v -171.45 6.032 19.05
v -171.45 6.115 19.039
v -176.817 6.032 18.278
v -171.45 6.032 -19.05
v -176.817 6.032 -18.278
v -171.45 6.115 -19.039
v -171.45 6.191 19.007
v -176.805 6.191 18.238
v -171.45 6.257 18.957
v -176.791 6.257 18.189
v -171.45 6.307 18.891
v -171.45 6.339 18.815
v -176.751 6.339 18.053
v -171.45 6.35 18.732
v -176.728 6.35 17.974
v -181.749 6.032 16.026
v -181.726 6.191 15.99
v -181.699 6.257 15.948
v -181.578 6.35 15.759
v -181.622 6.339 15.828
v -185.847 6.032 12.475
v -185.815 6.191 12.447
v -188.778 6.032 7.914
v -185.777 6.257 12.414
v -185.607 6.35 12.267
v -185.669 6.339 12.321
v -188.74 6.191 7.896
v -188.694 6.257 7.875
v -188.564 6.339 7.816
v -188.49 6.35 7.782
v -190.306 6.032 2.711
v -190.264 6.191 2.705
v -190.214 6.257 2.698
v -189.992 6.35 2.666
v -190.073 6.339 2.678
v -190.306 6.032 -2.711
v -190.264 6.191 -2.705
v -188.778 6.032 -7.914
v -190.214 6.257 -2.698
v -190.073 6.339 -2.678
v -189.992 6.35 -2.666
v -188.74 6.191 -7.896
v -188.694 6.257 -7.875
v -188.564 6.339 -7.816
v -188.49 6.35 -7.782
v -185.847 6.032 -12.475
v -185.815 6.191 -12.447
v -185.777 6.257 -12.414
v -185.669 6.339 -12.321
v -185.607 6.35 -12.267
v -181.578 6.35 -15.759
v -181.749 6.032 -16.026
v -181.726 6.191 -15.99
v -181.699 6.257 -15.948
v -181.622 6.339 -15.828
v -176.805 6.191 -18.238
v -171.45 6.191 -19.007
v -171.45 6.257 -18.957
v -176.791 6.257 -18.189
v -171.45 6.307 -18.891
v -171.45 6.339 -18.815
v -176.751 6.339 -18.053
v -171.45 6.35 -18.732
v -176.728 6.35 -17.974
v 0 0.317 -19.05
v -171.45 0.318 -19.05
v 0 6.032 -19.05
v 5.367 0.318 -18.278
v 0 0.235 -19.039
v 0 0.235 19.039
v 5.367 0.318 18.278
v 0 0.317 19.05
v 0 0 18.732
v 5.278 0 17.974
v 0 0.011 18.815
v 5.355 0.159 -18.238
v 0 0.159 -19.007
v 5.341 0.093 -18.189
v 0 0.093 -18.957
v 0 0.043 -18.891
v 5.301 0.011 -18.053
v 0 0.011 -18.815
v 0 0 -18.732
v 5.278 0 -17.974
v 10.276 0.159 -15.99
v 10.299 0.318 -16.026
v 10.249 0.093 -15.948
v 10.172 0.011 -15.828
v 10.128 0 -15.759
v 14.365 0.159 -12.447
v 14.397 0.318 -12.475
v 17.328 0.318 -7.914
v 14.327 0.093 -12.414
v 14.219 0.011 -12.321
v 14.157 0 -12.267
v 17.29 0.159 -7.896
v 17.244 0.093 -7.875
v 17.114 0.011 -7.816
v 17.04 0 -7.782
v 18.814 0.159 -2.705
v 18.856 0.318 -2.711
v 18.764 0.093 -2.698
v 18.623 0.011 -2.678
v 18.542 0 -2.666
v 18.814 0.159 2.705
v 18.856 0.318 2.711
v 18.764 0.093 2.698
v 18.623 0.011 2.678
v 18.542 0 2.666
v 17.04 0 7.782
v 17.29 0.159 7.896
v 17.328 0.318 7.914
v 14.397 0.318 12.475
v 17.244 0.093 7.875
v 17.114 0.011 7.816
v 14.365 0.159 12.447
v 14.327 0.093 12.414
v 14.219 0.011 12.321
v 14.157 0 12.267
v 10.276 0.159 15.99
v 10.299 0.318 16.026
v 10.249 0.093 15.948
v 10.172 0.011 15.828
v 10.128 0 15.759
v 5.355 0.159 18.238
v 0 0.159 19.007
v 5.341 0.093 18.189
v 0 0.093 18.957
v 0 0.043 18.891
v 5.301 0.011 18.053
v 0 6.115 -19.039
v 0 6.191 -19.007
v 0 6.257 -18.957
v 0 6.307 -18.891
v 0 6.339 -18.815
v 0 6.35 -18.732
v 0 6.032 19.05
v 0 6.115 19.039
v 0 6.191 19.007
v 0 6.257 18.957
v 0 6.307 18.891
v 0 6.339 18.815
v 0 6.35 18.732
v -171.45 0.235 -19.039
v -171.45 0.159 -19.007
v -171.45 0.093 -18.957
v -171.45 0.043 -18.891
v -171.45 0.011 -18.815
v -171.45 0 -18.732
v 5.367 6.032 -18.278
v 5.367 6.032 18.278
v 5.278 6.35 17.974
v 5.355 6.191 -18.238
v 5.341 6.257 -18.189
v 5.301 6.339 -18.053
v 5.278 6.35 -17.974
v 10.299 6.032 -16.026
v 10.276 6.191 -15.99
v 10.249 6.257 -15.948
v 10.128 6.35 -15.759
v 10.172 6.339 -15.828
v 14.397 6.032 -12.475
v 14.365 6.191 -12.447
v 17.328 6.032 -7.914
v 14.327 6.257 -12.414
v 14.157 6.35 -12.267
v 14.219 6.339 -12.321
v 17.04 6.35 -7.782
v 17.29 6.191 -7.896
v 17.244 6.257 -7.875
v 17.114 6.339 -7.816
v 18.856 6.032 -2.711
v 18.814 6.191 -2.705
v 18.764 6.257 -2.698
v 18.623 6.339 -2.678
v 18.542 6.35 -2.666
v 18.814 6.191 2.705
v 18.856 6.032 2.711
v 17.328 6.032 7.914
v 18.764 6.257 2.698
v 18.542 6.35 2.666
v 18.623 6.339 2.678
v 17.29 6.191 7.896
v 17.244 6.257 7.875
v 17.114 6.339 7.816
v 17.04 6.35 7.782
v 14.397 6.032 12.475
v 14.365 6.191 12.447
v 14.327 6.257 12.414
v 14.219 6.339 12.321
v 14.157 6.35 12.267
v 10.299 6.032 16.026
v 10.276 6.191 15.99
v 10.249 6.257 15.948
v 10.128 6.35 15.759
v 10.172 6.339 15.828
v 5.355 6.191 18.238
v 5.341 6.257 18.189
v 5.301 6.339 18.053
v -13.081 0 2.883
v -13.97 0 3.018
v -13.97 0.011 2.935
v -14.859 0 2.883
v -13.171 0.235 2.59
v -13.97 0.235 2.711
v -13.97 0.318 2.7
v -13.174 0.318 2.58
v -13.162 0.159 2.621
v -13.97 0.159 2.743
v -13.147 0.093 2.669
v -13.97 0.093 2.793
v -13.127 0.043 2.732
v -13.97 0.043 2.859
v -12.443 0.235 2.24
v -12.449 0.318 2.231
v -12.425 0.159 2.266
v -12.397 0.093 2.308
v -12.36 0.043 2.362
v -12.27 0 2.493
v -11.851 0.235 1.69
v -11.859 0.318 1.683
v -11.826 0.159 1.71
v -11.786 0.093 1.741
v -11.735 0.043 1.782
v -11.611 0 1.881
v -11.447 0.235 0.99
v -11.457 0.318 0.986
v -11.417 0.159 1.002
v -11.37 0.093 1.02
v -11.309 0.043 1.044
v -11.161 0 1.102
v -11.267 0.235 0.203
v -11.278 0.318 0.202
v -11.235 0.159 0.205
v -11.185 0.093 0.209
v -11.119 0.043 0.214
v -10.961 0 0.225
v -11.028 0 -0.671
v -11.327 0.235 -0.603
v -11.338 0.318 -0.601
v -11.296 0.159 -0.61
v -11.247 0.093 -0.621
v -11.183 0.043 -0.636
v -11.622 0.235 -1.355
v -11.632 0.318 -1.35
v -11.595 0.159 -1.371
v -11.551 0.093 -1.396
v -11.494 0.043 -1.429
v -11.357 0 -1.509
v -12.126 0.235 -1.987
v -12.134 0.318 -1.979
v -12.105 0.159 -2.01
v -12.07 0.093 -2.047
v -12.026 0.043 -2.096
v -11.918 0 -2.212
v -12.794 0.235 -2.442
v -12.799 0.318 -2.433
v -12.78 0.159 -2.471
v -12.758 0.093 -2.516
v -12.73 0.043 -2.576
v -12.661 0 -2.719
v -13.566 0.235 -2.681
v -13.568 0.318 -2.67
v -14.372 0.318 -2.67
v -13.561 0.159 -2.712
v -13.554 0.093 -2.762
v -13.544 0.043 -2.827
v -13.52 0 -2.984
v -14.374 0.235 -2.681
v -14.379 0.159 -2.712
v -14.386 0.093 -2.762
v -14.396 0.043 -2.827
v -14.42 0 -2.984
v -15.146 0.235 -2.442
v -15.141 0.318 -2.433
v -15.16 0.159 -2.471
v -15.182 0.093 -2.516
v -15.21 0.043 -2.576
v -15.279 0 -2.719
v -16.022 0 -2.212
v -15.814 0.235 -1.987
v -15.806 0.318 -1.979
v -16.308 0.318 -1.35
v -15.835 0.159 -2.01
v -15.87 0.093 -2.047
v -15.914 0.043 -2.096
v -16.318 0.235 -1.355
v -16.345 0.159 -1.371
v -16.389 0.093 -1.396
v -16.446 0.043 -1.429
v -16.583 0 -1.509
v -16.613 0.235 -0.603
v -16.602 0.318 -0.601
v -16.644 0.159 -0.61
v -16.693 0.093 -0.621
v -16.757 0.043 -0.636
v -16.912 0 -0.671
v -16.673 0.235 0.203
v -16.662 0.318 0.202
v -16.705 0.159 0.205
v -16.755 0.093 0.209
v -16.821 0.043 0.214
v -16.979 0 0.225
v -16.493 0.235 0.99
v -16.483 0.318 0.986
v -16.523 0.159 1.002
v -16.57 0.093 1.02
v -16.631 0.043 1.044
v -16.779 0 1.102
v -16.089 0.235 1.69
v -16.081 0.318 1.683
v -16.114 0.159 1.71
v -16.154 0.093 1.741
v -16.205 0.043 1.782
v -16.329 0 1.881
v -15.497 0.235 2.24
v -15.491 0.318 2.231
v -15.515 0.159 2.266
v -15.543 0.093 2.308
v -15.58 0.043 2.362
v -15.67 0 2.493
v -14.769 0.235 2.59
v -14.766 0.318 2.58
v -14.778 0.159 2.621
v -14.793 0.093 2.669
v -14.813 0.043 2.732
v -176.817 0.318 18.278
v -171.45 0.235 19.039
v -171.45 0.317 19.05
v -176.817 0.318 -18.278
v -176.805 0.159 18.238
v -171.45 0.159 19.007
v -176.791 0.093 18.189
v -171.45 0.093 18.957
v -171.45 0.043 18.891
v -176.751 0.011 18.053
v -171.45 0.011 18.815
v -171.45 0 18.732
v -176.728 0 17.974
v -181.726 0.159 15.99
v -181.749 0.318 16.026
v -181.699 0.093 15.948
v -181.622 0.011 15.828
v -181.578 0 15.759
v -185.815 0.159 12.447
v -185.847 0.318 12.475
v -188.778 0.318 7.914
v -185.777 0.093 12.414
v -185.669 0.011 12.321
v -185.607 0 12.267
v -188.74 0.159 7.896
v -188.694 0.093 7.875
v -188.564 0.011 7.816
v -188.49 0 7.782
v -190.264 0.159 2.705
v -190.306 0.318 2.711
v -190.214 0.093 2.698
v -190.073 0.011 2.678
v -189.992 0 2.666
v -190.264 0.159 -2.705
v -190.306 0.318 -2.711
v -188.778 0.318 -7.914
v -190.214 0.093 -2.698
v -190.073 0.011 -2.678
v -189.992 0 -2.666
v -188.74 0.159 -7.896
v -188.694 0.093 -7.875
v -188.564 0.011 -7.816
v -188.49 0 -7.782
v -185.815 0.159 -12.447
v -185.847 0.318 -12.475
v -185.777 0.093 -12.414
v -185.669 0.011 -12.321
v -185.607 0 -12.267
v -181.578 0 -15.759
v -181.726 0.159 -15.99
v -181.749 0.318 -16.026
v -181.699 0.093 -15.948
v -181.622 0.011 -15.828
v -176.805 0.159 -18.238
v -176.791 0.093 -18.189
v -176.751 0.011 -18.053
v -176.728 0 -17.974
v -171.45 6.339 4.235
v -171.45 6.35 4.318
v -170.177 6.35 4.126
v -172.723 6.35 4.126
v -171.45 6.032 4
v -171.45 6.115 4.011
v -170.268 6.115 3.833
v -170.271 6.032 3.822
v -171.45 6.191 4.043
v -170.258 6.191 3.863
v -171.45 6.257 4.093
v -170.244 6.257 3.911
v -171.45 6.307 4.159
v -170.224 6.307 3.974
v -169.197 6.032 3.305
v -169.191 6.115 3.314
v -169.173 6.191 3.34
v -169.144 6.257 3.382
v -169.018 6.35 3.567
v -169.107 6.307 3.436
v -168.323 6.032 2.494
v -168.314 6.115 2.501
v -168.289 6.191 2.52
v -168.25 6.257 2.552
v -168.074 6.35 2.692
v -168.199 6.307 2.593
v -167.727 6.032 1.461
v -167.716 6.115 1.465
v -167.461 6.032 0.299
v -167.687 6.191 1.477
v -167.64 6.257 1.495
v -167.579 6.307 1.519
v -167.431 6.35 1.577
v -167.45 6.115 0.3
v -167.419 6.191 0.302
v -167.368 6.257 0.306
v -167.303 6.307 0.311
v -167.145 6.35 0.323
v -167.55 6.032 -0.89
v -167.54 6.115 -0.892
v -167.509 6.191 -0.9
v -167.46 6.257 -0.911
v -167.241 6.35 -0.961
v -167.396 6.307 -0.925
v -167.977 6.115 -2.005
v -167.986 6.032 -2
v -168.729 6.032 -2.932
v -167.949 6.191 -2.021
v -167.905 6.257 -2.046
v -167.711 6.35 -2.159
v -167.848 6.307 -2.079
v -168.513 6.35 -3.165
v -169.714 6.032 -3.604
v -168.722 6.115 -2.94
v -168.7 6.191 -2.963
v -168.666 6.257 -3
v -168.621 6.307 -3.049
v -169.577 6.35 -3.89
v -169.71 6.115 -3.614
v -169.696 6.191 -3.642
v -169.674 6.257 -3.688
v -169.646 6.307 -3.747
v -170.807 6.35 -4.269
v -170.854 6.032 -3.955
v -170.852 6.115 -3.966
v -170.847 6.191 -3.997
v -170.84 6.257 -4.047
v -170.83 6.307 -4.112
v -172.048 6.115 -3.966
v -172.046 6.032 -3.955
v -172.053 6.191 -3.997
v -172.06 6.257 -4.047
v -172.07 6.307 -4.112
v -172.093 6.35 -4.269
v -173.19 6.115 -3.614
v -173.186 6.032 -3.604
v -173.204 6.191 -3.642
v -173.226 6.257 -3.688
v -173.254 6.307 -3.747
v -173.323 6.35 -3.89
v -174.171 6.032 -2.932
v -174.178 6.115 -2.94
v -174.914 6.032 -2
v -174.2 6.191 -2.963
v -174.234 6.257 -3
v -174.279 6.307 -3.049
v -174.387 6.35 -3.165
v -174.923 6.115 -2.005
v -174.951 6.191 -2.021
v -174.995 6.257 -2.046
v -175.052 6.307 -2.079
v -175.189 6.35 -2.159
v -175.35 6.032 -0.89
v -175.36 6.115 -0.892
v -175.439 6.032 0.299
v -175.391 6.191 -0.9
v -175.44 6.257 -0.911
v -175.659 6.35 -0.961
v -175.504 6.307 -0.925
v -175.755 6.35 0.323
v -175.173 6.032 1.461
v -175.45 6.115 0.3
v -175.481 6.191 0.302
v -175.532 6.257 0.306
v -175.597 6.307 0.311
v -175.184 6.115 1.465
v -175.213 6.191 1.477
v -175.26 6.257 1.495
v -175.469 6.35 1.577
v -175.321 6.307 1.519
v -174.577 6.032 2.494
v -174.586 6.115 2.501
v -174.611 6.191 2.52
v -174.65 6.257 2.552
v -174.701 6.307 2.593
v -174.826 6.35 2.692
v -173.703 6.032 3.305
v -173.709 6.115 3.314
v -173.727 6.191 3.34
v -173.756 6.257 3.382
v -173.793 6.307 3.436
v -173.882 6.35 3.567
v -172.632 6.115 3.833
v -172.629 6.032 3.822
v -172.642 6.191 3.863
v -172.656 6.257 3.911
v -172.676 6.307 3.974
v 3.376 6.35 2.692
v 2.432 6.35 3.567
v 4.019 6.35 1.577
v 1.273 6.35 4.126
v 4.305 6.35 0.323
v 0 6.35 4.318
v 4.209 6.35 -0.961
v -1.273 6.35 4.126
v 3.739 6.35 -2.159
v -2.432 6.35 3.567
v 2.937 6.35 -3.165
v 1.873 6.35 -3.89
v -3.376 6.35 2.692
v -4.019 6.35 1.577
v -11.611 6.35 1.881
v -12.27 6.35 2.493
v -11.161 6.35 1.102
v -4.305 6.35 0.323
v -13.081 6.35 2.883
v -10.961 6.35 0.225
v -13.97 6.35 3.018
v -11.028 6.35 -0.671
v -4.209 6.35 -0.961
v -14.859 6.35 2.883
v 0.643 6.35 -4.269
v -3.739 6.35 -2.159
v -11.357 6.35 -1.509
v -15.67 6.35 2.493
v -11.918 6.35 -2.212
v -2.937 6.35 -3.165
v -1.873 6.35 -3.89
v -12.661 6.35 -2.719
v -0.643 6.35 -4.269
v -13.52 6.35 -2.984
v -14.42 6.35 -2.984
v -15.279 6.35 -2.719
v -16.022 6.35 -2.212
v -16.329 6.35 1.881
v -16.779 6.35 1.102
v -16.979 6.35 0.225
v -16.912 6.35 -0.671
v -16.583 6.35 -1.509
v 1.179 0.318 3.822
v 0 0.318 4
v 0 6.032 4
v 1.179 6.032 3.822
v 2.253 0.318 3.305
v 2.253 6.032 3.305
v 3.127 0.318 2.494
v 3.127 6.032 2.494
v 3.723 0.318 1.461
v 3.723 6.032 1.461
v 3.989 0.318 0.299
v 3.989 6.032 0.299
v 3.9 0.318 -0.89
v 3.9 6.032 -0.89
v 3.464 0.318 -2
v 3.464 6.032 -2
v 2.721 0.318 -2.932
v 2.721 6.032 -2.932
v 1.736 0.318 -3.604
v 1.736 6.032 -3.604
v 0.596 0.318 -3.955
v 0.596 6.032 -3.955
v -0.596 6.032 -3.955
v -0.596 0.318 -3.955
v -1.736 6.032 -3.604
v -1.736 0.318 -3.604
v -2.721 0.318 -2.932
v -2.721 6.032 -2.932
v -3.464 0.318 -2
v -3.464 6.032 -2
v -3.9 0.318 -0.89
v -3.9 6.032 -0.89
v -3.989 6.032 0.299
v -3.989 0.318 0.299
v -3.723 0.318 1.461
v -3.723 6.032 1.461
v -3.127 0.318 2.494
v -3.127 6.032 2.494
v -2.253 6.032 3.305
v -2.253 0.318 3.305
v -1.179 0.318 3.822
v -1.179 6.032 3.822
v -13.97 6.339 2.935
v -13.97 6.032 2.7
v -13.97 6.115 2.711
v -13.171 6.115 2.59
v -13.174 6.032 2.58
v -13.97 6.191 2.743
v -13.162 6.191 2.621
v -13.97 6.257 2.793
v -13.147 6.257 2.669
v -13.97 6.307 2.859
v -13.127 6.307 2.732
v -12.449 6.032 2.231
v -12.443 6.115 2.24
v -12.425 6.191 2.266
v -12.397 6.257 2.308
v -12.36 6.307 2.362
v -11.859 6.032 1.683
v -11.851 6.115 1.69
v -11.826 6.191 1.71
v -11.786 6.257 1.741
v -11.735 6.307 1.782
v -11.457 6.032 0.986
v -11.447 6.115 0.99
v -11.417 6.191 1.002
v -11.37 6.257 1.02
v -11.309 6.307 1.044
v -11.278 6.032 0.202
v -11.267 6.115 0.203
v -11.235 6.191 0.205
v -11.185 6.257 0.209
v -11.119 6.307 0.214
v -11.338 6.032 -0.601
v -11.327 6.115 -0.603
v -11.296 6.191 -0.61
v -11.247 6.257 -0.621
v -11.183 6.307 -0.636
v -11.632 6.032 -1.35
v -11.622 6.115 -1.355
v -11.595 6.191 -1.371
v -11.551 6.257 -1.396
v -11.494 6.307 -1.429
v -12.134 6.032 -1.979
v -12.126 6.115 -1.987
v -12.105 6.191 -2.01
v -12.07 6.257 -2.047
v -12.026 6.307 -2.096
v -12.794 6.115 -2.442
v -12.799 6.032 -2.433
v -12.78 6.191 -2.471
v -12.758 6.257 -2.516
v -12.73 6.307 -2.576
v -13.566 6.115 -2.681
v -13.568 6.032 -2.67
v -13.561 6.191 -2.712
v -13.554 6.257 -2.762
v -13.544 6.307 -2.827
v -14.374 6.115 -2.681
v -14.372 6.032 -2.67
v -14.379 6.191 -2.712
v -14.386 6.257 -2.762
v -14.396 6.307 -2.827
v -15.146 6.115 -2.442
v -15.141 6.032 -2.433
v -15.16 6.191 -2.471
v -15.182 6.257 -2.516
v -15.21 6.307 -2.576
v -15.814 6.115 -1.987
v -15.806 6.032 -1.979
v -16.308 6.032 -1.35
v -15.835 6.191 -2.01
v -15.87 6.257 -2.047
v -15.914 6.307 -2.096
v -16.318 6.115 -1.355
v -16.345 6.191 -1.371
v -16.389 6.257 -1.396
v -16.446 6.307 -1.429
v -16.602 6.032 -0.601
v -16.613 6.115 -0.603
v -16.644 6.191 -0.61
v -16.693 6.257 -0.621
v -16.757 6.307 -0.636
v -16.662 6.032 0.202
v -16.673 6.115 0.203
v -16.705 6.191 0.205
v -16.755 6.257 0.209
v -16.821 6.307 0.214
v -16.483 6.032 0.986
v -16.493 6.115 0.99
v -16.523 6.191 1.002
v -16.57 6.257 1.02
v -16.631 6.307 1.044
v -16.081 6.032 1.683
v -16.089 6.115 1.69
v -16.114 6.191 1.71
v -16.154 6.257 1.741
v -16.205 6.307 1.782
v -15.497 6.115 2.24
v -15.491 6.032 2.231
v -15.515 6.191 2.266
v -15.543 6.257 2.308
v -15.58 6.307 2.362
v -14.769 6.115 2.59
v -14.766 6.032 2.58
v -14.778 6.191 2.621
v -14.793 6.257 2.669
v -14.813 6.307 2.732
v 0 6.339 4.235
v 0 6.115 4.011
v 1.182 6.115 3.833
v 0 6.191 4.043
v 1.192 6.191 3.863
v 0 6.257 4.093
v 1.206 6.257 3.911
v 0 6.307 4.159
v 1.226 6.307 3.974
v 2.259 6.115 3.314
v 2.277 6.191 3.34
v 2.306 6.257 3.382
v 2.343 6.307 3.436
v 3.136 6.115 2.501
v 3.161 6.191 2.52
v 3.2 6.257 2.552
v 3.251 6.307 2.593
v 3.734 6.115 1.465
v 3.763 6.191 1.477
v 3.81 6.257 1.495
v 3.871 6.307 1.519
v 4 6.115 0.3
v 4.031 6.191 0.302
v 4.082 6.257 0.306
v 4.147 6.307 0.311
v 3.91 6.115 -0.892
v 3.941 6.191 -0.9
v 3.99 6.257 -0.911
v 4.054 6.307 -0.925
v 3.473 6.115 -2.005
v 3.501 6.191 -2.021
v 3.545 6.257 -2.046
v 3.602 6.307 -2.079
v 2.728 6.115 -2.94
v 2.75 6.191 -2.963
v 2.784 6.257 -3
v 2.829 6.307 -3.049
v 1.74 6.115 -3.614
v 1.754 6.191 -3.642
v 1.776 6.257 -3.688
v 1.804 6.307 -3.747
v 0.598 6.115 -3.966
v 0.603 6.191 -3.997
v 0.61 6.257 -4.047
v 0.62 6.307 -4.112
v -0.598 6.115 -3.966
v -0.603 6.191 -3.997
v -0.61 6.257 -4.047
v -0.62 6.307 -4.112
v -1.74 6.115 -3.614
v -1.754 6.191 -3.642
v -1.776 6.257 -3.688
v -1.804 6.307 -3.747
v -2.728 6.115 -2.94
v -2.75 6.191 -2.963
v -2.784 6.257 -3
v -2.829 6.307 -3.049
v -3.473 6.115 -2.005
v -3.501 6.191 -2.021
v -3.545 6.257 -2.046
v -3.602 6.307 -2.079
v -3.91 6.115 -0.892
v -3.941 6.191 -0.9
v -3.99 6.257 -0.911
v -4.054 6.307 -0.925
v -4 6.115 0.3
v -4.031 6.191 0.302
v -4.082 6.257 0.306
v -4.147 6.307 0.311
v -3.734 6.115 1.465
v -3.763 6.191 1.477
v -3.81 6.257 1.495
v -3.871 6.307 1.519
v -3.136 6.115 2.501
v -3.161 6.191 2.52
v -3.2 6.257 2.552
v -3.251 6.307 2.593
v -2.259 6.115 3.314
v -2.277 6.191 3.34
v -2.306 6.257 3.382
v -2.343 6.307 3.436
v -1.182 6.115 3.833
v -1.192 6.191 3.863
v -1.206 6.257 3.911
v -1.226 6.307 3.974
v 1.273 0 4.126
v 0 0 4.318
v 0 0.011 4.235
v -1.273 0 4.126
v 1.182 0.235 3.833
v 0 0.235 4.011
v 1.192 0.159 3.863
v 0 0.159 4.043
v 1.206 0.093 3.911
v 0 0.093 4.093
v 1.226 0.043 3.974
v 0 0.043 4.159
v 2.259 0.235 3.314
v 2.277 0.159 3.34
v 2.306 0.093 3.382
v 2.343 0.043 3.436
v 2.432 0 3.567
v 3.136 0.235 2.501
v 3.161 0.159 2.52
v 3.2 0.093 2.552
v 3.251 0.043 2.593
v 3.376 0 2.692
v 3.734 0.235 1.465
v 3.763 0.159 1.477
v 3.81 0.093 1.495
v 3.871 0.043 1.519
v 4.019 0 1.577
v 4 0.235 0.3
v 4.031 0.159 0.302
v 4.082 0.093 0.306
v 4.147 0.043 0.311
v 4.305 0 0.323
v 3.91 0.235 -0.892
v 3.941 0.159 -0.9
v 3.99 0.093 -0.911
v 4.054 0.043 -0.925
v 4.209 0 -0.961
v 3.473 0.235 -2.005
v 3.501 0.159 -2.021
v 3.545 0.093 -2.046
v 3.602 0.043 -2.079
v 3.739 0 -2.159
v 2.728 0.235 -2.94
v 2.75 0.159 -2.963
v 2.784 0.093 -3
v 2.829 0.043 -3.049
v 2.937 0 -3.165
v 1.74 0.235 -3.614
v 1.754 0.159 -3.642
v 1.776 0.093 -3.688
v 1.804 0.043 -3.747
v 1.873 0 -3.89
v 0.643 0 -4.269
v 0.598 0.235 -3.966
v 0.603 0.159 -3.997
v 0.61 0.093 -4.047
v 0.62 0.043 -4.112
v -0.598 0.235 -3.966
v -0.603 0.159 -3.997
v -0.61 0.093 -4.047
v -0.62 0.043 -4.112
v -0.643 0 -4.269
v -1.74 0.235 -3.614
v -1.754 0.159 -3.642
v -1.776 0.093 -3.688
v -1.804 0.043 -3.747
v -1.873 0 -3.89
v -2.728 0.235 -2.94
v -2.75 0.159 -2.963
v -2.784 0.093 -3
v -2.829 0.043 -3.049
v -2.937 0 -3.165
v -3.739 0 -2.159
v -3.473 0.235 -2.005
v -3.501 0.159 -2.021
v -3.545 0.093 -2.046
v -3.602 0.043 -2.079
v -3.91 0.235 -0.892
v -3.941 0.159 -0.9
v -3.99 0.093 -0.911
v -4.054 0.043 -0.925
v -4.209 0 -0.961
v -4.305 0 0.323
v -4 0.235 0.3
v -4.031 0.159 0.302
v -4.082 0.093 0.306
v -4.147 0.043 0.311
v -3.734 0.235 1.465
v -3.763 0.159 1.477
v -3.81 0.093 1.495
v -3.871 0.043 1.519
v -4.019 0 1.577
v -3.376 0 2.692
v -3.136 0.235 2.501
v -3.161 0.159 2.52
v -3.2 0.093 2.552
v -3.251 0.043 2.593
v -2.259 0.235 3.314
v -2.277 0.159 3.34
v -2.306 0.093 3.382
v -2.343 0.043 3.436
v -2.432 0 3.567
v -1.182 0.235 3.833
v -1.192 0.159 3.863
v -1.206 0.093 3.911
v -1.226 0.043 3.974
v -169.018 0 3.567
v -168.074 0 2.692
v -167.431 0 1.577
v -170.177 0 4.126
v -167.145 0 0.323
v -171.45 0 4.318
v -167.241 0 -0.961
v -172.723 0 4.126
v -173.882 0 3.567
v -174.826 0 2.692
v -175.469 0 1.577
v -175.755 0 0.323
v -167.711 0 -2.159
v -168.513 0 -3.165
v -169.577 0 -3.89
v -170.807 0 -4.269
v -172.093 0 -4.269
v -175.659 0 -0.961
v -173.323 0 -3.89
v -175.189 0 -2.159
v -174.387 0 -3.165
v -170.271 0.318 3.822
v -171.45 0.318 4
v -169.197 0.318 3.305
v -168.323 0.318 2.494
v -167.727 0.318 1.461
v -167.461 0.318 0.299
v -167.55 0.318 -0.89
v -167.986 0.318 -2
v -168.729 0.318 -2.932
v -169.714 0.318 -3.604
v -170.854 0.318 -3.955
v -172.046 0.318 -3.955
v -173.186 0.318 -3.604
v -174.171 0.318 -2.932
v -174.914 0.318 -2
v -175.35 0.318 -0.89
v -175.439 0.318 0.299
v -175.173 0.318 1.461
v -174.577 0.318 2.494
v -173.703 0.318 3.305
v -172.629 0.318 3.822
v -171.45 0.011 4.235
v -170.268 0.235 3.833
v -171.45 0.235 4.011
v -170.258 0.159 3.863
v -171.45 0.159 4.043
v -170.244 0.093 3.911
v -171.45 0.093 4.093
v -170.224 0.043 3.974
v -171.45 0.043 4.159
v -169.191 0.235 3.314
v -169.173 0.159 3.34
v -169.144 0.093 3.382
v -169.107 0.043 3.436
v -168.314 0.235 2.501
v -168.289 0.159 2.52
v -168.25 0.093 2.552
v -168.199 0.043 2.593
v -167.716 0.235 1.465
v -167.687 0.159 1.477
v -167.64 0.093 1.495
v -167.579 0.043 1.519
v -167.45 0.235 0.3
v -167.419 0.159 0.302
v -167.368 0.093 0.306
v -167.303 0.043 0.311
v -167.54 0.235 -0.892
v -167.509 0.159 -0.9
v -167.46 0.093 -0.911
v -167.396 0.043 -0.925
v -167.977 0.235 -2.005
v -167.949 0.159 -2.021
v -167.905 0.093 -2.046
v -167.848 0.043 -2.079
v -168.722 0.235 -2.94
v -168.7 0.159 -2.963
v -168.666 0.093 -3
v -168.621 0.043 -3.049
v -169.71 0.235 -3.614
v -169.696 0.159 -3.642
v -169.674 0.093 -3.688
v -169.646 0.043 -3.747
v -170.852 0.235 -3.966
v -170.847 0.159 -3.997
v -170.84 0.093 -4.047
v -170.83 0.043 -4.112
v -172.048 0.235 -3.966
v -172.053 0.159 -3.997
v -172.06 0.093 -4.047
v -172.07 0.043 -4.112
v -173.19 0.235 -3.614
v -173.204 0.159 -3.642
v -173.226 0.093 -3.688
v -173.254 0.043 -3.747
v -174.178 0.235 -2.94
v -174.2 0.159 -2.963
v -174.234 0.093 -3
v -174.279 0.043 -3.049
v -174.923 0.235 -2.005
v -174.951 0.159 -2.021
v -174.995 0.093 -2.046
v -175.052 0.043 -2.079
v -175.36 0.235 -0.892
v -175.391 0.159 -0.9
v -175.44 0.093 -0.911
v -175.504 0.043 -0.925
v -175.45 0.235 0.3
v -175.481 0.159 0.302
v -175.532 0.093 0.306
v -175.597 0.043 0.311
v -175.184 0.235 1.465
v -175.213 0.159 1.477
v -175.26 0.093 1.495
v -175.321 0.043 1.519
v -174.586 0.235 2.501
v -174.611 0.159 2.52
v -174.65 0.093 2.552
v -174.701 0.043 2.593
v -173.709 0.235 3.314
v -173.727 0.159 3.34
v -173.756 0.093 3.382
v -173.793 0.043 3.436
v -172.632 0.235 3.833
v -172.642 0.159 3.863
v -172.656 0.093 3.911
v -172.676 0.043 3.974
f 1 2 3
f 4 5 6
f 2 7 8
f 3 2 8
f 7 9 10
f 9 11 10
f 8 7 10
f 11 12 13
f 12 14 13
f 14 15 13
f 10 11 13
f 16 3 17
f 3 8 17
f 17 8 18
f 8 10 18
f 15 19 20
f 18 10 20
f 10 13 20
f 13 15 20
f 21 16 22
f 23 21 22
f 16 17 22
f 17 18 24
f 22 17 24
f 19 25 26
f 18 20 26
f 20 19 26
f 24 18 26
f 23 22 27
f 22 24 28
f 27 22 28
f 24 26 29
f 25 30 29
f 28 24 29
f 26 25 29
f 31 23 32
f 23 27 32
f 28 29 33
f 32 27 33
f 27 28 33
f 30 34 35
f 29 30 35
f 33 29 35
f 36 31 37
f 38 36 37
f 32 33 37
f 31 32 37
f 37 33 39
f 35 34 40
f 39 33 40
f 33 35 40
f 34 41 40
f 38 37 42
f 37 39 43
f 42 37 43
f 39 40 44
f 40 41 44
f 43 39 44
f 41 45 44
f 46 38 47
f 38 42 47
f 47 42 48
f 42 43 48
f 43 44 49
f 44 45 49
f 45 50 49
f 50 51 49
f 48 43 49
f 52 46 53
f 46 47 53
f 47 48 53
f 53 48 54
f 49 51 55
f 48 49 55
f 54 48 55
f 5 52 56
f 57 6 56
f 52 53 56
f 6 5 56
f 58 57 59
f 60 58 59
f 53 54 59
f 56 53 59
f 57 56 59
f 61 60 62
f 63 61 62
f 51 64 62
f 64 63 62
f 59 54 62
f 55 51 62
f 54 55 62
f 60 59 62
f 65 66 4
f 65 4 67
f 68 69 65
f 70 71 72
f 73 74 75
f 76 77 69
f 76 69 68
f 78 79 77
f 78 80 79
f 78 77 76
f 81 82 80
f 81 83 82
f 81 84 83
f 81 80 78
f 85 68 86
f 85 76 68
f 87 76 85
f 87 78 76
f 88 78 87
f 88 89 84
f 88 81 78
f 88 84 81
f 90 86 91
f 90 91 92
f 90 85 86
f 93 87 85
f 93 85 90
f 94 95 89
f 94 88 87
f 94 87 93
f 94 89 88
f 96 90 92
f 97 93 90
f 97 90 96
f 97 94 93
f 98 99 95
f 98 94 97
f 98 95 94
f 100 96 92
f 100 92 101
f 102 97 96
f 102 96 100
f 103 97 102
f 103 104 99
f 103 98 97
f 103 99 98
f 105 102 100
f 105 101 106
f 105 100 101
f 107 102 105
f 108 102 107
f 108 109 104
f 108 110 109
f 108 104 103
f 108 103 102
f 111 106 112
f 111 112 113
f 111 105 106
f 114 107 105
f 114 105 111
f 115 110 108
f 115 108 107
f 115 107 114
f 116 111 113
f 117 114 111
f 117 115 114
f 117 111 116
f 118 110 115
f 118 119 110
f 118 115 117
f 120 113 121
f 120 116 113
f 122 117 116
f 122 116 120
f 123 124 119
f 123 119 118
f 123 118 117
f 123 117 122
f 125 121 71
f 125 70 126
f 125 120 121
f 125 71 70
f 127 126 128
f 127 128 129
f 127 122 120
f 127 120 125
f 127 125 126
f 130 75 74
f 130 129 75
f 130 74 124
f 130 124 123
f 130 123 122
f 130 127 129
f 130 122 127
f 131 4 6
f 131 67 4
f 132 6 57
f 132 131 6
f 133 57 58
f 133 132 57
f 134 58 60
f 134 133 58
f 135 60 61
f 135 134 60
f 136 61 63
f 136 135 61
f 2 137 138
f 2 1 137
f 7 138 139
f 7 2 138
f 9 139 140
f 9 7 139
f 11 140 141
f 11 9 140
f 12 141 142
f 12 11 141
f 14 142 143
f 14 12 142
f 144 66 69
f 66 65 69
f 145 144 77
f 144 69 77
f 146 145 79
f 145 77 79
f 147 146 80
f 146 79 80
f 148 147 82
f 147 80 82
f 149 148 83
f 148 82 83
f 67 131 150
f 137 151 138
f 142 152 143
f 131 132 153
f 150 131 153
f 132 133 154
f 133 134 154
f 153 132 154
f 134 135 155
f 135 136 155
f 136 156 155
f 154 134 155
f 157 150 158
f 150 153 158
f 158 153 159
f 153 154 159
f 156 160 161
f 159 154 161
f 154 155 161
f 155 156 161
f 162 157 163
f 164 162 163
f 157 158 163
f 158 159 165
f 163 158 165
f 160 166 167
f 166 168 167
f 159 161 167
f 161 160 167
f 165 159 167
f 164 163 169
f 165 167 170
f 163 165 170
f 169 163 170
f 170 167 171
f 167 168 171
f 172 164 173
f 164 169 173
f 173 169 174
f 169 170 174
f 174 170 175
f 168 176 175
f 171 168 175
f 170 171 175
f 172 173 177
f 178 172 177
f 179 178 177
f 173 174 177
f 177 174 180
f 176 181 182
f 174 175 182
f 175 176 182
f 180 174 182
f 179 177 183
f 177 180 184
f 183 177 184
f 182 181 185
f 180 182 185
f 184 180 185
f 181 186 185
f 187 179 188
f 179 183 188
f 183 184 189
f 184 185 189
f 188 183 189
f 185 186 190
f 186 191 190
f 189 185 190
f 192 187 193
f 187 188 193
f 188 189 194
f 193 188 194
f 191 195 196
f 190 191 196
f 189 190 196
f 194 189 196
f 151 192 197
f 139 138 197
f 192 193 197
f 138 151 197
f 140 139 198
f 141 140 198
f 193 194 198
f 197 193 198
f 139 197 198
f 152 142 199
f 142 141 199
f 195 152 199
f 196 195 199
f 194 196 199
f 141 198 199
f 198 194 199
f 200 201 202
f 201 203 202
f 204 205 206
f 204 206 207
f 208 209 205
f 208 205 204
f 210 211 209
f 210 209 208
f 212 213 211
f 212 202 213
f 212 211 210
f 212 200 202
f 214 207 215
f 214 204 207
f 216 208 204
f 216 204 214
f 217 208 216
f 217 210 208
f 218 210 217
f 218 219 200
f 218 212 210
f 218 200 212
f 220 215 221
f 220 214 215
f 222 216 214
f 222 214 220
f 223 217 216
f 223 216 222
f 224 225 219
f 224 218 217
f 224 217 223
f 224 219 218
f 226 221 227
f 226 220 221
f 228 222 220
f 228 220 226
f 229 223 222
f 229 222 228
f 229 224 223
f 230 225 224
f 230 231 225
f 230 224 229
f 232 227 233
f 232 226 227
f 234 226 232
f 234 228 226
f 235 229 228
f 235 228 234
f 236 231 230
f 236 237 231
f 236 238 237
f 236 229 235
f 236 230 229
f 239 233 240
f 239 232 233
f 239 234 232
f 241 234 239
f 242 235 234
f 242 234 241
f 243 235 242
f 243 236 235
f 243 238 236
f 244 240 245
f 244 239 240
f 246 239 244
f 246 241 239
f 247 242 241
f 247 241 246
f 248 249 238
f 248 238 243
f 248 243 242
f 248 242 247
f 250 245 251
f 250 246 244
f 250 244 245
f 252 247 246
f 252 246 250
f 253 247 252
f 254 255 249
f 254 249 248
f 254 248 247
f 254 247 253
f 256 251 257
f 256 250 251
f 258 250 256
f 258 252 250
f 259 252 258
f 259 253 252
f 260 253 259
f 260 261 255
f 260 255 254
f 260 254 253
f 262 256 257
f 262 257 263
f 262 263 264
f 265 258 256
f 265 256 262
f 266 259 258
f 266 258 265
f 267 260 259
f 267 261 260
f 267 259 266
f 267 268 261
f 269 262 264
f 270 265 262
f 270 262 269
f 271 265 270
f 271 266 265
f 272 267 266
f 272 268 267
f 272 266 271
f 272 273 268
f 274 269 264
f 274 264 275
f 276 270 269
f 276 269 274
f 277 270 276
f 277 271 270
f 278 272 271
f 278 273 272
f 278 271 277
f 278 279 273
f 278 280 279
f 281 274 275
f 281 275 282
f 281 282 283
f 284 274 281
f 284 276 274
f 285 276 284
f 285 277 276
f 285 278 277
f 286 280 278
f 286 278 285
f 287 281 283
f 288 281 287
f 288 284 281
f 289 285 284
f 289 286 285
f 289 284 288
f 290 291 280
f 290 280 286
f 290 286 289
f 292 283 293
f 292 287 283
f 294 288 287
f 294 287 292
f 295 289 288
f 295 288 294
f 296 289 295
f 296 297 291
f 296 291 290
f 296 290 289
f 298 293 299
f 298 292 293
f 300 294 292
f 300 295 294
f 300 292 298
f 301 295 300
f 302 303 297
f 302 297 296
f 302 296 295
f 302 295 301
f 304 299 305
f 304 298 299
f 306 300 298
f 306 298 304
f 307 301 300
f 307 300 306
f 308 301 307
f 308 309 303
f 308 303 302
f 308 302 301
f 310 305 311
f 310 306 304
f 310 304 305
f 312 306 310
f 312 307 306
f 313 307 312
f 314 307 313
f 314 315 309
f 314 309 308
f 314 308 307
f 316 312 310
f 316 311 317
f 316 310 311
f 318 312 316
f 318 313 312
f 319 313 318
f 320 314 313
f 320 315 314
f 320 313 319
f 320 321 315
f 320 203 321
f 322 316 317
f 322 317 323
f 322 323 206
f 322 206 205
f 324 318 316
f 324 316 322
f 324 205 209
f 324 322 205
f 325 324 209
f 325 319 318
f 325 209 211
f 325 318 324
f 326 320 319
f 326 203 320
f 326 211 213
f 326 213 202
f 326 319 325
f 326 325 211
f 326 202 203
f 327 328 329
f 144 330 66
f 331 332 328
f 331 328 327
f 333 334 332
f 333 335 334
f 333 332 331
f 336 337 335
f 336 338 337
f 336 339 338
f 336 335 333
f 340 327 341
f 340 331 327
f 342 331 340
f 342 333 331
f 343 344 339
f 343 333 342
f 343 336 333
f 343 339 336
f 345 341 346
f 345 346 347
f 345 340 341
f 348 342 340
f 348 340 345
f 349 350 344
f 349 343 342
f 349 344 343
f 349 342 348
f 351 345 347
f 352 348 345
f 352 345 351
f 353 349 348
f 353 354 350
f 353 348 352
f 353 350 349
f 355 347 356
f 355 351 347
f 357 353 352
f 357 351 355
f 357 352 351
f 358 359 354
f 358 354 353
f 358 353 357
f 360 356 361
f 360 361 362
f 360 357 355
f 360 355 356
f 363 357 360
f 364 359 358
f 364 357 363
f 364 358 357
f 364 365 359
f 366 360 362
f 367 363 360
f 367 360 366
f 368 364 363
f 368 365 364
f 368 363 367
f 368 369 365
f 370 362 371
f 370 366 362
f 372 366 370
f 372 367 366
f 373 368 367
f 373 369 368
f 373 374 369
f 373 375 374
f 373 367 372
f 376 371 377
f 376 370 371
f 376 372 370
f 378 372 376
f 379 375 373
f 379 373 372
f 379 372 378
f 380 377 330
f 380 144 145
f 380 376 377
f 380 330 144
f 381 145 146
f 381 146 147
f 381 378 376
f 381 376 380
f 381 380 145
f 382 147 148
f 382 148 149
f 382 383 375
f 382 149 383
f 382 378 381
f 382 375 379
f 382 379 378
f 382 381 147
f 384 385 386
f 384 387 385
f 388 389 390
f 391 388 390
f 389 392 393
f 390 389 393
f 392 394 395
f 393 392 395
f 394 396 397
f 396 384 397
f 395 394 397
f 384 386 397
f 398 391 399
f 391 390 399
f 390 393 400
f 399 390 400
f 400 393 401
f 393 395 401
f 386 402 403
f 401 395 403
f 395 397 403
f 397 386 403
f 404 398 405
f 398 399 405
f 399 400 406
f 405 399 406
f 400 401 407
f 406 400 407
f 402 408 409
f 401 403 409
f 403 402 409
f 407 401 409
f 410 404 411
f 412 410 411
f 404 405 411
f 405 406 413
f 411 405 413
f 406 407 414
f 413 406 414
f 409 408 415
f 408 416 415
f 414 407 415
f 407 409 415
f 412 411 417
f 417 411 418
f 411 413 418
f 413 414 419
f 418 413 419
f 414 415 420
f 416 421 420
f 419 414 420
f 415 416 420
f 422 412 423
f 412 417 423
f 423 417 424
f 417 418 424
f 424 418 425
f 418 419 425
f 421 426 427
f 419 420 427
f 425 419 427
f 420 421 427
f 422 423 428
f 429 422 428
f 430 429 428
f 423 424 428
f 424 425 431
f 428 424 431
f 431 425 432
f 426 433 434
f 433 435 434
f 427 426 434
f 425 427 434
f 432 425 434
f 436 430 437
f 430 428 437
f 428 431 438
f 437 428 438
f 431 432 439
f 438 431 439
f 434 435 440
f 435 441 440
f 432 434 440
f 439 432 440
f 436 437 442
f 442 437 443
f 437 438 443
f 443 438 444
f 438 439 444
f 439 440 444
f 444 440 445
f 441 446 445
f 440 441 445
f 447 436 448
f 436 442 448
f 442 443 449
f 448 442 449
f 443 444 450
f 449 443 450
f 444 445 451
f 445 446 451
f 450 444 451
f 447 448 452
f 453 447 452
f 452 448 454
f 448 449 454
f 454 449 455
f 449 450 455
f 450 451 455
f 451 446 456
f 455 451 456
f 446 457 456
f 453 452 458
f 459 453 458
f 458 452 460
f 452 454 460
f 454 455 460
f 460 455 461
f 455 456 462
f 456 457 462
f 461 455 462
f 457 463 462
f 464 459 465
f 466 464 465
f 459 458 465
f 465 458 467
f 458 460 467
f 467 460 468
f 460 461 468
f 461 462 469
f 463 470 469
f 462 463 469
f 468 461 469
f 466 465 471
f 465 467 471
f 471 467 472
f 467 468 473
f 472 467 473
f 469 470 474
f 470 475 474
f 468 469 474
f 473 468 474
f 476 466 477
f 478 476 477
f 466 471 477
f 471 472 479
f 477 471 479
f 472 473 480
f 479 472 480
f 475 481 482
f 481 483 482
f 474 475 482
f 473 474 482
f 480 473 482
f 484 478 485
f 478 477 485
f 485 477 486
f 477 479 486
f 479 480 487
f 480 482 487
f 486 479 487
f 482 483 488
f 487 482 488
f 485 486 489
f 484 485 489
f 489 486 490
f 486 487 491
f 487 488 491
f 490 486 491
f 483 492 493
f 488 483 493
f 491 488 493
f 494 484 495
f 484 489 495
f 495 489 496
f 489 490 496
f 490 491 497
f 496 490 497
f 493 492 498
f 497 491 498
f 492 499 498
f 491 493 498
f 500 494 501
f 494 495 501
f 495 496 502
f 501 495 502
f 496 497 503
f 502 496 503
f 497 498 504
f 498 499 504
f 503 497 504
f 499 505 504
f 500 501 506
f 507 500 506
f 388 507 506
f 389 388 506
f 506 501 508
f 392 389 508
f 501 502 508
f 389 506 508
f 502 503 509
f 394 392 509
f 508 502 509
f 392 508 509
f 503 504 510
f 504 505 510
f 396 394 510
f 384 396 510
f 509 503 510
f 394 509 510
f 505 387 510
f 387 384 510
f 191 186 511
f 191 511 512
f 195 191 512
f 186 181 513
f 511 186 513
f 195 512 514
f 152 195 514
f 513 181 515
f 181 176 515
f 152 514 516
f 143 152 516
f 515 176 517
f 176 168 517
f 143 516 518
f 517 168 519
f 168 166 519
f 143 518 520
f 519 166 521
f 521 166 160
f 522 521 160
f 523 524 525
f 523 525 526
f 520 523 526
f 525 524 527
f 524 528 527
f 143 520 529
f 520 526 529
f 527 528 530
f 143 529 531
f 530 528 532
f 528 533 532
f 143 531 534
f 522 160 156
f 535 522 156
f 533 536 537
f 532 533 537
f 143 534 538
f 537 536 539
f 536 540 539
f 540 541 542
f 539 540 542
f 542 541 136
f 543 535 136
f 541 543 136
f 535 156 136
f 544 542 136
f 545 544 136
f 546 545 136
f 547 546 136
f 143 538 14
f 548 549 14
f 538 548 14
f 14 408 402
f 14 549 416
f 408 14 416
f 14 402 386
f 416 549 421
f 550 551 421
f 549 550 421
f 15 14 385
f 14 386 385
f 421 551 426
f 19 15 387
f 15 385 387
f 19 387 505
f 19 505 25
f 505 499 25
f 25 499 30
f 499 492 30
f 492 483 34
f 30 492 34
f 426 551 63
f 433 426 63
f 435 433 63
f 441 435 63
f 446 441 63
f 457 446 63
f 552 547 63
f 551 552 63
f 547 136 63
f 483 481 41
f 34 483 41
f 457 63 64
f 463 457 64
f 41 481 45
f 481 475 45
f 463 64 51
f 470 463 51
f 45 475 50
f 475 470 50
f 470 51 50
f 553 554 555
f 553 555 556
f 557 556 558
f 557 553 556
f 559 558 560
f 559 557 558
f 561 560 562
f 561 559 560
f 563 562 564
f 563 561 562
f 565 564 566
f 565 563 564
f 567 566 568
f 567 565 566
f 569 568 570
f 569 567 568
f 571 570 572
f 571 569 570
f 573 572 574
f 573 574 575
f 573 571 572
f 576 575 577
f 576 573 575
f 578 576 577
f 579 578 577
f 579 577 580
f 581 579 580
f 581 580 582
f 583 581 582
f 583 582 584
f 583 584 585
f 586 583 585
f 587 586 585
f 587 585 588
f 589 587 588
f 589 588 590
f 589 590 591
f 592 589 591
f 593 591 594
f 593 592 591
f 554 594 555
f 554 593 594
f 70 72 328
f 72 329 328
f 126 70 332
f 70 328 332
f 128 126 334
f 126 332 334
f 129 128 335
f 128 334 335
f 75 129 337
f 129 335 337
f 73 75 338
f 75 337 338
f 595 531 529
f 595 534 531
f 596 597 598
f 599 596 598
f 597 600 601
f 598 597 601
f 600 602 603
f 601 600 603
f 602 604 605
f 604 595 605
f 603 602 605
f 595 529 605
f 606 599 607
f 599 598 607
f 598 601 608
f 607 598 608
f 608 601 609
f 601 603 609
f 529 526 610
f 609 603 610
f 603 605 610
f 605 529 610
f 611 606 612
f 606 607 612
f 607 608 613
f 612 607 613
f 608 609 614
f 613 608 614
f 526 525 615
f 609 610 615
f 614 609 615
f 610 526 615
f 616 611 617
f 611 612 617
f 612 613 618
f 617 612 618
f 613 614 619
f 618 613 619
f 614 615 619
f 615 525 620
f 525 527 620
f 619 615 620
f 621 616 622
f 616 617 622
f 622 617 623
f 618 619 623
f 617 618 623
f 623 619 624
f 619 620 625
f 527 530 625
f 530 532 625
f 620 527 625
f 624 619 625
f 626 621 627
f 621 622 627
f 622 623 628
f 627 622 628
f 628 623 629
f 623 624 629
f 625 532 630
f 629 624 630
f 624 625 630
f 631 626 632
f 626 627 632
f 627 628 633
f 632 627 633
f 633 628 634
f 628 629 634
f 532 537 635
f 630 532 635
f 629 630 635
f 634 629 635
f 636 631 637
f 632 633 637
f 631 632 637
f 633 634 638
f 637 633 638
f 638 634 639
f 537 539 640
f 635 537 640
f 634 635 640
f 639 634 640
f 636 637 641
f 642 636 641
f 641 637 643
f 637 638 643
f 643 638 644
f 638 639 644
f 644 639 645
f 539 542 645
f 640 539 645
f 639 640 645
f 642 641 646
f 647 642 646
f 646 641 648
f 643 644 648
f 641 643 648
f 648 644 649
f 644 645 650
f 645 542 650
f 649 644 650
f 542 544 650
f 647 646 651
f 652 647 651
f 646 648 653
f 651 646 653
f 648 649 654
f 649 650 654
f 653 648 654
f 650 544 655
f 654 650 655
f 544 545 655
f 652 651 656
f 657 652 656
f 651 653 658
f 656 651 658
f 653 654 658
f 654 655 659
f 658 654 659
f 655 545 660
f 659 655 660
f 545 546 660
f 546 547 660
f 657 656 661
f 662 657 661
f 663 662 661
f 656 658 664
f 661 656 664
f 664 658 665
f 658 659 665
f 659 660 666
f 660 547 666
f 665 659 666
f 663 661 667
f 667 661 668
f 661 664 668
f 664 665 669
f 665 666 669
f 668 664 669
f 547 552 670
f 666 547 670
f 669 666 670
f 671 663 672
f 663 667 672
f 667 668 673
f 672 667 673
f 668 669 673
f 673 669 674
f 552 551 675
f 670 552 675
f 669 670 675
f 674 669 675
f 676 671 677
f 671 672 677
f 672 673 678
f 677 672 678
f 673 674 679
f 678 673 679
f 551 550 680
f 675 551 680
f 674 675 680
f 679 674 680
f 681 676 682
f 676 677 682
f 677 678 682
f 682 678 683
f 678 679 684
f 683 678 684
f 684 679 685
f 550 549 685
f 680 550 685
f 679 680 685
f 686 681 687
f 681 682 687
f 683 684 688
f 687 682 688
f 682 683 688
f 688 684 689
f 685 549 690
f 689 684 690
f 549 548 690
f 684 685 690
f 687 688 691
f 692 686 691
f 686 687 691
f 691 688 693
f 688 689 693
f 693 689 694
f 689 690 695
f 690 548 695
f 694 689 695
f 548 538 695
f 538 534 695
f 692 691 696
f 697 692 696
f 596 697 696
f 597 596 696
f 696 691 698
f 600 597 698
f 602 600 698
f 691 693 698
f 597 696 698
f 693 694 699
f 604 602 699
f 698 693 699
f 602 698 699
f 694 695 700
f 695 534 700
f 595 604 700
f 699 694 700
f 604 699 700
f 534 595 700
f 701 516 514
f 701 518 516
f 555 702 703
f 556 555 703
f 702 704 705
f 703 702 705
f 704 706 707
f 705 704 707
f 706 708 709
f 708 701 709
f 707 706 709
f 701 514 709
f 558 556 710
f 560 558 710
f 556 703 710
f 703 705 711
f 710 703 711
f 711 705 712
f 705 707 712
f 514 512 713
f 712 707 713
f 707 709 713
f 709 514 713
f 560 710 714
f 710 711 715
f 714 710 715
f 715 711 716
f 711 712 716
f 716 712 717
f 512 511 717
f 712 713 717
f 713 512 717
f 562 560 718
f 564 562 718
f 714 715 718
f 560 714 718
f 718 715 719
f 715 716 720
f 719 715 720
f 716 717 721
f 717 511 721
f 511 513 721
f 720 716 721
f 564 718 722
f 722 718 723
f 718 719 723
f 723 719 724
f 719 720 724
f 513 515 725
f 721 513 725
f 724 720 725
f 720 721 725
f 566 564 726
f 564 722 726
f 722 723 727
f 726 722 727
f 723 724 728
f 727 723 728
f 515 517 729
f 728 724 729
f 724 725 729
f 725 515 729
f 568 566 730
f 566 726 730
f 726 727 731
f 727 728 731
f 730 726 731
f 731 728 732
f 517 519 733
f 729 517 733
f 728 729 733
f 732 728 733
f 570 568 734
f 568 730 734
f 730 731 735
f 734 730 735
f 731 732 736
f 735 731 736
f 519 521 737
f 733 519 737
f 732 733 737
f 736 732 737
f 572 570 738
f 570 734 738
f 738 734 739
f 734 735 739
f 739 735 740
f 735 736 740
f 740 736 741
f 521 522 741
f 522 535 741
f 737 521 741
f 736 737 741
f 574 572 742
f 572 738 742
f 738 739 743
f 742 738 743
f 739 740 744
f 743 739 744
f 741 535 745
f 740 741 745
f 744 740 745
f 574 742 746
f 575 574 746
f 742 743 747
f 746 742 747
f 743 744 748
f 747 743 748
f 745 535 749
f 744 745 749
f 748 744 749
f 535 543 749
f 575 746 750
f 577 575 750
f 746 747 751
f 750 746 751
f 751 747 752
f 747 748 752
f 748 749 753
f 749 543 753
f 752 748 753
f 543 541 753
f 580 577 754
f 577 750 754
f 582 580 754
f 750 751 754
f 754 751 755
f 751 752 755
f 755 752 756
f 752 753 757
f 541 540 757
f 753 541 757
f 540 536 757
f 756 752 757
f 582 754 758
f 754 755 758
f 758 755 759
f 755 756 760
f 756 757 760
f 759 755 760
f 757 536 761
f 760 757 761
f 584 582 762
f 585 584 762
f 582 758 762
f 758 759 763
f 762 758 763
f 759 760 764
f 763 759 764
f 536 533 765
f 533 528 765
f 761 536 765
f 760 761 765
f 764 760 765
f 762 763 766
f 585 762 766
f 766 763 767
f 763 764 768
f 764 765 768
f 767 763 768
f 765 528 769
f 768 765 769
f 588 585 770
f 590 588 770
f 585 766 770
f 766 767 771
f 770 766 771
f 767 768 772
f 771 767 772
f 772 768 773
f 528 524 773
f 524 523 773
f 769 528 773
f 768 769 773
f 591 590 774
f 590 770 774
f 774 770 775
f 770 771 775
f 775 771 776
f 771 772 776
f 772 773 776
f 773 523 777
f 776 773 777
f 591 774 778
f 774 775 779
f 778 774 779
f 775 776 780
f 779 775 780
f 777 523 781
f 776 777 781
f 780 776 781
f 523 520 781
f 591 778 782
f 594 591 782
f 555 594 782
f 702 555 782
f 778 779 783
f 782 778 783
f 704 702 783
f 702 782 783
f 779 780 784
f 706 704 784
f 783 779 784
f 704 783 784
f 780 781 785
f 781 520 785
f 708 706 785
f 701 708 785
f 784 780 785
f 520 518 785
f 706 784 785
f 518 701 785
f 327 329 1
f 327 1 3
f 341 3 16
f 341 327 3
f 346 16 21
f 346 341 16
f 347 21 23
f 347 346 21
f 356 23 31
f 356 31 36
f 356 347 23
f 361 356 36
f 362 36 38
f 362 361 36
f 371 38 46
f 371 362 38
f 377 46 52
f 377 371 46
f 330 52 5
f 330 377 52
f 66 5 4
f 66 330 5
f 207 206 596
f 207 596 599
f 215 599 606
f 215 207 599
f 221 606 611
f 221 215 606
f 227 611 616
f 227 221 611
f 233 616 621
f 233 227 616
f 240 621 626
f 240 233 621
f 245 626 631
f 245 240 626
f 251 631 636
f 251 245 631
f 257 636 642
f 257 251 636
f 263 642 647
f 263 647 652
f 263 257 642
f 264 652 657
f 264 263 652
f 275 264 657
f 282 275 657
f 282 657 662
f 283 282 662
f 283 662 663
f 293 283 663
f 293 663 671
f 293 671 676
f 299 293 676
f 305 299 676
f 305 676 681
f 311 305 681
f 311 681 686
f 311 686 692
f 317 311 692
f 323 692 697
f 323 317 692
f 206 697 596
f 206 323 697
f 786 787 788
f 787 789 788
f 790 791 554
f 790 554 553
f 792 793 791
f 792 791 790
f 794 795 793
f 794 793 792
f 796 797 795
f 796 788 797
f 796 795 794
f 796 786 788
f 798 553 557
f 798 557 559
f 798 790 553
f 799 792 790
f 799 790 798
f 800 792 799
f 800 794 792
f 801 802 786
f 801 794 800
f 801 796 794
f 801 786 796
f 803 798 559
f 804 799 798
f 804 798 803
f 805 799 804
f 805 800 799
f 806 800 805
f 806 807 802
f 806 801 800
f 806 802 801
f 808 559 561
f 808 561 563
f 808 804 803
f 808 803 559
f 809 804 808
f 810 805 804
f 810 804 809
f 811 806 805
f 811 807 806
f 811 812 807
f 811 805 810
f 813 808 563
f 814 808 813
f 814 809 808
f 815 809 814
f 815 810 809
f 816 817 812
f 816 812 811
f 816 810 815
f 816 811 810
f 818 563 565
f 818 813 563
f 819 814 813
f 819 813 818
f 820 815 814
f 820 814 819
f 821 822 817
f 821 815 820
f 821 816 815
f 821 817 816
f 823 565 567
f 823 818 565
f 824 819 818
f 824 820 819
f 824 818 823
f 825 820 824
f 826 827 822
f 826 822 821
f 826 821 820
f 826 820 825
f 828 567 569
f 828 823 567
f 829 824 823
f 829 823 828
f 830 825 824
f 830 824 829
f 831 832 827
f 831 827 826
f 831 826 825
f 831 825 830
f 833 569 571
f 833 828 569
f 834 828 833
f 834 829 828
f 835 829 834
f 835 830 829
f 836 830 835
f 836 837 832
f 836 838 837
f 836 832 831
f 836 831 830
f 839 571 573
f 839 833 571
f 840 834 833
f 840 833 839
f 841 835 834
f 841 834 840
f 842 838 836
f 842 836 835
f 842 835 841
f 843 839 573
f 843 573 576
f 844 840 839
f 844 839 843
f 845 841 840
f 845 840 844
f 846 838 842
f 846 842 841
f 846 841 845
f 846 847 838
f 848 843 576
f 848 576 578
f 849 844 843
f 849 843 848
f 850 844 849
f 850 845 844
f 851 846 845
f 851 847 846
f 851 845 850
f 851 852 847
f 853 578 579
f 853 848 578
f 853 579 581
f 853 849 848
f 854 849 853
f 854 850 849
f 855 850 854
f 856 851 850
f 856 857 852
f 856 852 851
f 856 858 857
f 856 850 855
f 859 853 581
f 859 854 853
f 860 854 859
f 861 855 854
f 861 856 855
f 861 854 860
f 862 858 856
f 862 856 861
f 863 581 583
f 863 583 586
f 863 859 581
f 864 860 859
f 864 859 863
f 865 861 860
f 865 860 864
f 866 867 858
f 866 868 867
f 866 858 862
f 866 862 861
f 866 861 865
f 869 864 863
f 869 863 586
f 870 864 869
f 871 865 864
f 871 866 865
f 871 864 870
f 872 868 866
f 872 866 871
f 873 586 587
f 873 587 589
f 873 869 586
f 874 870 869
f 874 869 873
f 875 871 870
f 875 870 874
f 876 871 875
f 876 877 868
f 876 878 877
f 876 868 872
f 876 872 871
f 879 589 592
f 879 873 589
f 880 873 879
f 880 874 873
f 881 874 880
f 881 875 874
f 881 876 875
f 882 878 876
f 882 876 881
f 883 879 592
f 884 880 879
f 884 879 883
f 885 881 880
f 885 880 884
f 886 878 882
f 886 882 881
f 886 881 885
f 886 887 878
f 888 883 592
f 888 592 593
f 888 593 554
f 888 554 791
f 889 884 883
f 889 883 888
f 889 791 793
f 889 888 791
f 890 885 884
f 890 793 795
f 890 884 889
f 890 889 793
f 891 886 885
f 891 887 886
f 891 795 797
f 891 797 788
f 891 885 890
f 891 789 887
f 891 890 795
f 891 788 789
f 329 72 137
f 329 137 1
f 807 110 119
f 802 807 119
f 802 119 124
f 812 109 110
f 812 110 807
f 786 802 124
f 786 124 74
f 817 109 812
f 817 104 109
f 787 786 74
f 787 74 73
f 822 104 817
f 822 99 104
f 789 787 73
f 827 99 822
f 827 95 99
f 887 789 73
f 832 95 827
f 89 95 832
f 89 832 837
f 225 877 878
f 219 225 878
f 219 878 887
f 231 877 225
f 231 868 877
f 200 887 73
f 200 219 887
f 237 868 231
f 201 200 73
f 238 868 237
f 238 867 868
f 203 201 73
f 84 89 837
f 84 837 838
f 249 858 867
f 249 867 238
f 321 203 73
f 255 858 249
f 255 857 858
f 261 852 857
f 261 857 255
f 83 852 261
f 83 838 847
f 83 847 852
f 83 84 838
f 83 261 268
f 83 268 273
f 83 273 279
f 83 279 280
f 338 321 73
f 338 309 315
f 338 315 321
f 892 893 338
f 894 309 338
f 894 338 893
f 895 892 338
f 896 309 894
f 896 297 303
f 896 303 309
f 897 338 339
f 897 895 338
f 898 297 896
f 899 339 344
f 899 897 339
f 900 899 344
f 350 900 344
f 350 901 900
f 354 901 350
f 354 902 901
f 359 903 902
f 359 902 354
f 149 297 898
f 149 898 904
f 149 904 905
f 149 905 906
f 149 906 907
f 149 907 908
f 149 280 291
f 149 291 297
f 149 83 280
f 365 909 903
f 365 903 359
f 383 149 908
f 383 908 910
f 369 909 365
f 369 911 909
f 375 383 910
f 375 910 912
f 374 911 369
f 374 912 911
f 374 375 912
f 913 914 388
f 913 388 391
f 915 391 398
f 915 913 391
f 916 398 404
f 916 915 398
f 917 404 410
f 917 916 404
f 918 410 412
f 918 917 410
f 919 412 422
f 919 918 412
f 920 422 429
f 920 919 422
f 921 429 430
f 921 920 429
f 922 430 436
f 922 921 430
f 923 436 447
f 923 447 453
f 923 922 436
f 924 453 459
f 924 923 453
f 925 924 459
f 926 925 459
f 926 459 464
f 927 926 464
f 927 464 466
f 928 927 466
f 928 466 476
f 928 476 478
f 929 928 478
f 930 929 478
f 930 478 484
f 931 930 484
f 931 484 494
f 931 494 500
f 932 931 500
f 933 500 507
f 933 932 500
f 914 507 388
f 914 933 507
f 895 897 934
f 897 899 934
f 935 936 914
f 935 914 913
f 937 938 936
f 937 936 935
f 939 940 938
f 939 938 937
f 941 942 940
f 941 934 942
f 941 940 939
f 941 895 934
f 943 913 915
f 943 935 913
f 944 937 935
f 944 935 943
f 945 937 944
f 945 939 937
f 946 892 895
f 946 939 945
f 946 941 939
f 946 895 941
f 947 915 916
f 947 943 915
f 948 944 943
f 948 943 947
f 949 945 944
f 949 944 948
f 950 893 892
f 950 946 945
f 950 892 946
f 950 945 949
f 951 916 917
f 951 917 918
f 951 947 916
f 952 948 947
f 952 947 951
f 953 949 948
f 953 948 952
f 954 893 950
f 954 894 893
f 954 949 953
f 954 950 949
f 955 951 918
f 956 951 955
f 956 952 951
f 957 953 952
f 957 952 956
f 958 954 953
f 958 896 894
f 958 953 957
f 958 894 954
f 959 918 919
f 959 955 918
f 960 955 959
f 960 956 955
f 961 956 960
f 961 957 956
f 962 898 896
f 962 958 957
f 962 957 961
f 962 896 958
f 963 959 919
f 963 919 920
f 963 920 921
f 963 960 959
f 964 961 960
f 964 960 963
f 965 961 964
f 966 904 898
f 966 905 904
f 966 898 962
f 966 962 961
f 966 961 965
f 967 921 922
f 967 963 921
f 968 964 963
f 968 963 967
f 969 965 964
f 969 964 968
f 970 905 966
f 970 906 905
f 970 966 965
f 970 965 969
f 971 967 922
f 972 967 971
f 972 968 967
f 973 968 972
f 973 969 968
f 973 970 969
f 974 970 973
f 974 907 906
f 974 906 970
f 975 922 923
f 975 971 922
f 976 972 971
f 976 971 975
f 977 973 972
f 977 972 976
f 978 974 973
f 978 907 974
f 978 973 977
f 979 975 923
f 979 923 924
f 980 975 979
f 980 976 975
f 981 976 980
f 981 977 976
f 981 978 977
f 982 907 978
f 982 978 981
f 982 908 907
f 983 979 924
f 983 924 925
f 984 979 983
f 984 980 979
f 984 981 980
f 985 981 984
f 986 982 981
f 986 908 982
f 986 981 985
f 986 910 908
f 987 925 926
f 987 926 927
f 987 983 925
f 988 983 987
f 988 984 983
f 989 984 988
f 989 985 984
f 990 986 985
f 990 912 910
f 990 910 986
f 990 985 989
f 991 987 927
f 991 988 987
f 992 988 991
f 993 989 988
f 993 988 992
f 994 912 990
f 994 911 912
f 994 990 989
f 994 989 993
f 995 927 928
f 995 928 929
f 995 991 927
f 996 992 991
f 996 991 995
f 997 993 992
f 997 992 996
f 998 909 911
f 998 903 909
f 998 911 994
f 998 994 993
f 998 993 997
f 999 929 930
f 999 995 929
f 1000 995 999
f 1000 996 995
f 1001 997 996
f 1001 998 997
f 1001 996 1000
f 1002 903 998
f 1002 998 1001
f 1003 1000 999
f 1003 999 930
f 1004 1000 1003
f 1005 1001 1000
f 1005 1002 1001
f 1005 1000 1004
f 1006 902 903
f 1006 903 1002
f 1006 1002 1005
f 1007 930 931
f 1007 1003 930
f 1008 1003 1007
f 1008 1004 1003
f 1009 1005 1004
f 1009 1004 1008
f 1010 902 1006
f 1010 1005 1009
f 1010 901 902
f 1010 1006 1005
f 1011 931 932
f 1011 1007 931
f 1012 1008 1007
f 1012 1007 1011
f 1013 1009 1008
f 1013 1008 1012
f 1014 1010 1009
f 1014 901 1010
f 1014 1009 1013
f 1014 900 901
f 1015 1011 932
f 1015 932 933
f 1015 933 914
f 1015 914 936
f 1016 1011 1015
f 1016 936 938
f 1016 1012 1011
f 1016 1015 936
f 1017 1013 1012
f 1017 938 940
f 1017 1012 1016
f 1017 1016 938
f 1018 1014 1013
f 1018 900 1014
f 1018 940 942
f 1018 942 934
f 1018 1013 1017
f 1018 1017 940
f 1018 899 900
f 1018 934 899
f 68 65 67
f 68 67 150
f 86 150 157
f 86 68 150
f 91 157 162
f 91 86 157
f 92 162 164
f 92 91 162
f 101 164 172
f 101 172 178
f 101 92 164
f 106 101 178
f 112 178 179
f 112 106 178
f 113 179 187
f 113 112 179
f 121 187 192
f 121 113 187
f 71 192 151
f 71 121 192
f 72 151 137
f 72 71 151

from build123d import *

# Parameters (mm, degrees)
SKETCH1_R           = 4
SKETCH1_R_2         = 2.7
BOSS_EXTRUDE1_DEPTH = 6.35
FILLET1_R           = 0.3175


with BuildPart() as part:
    # Sketch1 → Boss-Extrude1 (new body)
    with BuildSketch(Plane(origin=(0, 0, 0), x_dir=(1, 0, 0), z_dir=(0, 1, 0))):
        with BuildLine():
            Line((0, -19.05), (-171.45, -19.05))
            ThreePointArc((-171.45, -19.05), (-190.5, 0), (-171.45, 19.05))
            Line((-171.45, 19.05), (0, 19.05))
            ThreePointArc((0, 19.05), (19.05, 0), (0, -19.05))
        make_face()
        with Locations(Location((-171.45, 0, 0), (0, 0, 270))):
            Circle(SKETCH1_R, mode=Mode.SUBTRACT)
        with Locations(Location((0, 0, 0), (0, 0, 270))):
            Circle(SKETCH1_R, mode=Mode.SUBTRACT)
        with Locations(Location((-13.97, 0, 0), (0, 0, 270))):
            Circle(SKETCH1_R_2, mode=Mode.SUBTRACT)
    extrude(amount=BOSS_EXTRUDE1_DEPTH)

    # Fillet1
    fillet1_edges = [part.edges().sort_by_distance(p)[0] for p in [
        (-190.5, 6.35, 0),
        (-171.45, 0, -4),
        (-171.45, 6.35, -4),
        (-85.725, 6.35, 19.05),
        (0, 0, -4),
        (0, 6.35, -4),
        (-13.97, 0, -2.7),
        (-13.97, 6.35, -2.7),
        (19.05, 6.35, 0),
        (-85.725, 0, 19.05),
        (-190.5, 0, 0),
        (-85.725, 0, -19.05),
        (19.05, 0, 0),
        (-85.725, 6.35, -19.05),
    ]]
    fillet(fillet1_edges, radius=FILLET1_R)


solid = part.part
